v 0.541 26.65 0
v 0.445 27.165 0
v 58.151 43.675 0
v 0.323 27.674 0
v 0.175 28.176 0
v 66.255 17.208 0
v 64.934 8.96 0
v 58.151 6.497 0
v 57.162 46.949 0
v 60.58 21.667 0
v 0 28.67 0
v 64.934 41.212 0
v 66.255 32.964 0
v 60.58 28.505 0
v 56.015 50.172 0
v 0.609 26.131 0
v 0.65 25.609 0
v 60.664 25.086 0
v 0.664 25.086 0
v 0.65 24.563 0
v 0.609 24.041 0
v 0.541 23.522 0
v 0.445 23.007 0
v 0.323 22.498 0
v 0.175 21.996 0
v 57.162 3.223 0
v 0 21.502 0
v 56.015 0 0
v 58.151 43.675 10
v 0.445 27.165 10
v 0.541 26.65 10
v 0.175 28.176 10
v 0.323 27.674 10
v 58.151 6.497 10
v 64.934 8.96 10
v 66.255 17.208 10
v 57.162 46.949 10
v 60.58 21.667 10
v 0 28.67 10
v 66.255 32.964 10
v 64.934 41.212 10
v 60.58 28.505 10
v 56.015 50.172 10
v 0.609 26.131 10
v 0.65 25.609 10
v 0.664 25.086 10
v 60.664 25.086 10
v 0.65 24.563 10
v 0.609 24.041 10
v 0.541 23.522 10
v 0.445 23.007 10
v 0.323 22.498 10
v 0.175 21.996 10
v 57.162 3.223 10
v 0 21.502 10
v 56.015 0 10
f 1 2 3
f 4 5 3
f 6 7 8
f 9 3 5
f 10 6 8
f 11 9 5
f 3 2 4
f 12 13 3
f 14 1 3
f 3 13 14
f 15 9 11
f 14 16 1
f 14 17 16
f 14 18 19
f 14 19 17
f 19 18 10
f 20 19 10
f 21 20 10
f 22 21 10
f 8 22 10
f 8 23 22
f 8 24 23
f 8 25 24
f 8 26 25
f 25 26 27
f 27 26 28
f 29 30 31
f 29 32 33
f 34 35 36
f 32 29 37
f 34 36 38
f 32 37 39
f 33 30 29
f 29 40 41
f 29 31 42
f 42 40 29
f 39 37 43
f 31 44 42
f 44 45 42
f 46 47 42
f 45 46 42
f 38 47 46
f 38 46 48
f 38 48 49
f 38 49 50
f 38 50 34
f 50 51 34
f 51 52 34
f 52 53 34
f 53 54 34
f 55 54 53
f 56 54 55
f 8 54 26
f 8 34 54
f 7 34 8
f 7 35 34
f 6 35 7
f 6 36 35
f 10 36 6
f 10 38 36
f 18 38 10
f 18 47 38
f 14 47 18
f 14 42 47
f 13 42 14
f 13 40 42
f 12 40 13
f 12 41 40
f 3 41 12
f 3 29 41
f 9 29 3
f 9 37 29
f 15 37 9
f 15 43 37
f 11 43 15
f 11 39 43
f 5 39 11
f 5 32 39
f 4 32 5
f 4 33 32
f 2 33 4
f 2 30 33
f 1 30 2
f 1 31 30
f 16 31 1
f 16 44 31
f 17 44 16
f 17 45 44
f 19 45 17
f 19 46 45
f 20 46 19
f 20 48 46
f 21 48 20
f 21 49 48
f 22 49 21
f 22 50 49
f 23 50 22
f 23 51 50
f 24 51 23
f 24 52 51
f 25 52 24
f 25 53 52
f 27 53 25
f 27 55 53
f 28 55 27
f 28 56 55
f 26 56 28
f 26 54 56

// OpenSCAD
$fn = 32;

// ----------------------------------------------------------------------
// Gear sector: 2 teeth on 42 degrees
// ----------------------------------------------------------------------

// --- parameters (mm) ---
sector_angle = 42;        // sector angle, degrees
root_r = 70;              // root circle radius
tooth_h = 6;              // tooth height over the root circle
teeth = 2;                // number of teeth on the sector
hub_r = 10;               // hub bore radius
plate_t = 10;             // sector thickness, Z
arc_step = 3;             // sampling step of the root/hub arcs, degrees

tip_r = root_r + tooth_h;  // tip circle radius

profile = [[56.015, 0], [57.162, 3.223], [58.151, 6.497], [64.934, 8.96], [66.255, 17.208], [60.58, 21.667], [60.664, 25.086], [60.58, 28.505], [66.255, 32.964], [64.934, 41.212], [58.151, 43.675], [57.162, 46.949], [56.015, 50.172], [0, 28.67], [0.175, 28.176], [0.323, 27.674], [0.445, 27.165], [0.541, 26.65], [0.609, 26.131], [0.65, 25.609], [0.664, 25.086], [0.65, 24.563], [0.609, 24.041], [0.541, 23.522], [0.445, 23.007], [0.323, 22.498], [0.175, 21.996], [0, 21.502]];  // primary outline, 28 points, counter clockwise

// --- the one profile operation ---
linear_extrude(height = plate_t) polygon(points = profile);
